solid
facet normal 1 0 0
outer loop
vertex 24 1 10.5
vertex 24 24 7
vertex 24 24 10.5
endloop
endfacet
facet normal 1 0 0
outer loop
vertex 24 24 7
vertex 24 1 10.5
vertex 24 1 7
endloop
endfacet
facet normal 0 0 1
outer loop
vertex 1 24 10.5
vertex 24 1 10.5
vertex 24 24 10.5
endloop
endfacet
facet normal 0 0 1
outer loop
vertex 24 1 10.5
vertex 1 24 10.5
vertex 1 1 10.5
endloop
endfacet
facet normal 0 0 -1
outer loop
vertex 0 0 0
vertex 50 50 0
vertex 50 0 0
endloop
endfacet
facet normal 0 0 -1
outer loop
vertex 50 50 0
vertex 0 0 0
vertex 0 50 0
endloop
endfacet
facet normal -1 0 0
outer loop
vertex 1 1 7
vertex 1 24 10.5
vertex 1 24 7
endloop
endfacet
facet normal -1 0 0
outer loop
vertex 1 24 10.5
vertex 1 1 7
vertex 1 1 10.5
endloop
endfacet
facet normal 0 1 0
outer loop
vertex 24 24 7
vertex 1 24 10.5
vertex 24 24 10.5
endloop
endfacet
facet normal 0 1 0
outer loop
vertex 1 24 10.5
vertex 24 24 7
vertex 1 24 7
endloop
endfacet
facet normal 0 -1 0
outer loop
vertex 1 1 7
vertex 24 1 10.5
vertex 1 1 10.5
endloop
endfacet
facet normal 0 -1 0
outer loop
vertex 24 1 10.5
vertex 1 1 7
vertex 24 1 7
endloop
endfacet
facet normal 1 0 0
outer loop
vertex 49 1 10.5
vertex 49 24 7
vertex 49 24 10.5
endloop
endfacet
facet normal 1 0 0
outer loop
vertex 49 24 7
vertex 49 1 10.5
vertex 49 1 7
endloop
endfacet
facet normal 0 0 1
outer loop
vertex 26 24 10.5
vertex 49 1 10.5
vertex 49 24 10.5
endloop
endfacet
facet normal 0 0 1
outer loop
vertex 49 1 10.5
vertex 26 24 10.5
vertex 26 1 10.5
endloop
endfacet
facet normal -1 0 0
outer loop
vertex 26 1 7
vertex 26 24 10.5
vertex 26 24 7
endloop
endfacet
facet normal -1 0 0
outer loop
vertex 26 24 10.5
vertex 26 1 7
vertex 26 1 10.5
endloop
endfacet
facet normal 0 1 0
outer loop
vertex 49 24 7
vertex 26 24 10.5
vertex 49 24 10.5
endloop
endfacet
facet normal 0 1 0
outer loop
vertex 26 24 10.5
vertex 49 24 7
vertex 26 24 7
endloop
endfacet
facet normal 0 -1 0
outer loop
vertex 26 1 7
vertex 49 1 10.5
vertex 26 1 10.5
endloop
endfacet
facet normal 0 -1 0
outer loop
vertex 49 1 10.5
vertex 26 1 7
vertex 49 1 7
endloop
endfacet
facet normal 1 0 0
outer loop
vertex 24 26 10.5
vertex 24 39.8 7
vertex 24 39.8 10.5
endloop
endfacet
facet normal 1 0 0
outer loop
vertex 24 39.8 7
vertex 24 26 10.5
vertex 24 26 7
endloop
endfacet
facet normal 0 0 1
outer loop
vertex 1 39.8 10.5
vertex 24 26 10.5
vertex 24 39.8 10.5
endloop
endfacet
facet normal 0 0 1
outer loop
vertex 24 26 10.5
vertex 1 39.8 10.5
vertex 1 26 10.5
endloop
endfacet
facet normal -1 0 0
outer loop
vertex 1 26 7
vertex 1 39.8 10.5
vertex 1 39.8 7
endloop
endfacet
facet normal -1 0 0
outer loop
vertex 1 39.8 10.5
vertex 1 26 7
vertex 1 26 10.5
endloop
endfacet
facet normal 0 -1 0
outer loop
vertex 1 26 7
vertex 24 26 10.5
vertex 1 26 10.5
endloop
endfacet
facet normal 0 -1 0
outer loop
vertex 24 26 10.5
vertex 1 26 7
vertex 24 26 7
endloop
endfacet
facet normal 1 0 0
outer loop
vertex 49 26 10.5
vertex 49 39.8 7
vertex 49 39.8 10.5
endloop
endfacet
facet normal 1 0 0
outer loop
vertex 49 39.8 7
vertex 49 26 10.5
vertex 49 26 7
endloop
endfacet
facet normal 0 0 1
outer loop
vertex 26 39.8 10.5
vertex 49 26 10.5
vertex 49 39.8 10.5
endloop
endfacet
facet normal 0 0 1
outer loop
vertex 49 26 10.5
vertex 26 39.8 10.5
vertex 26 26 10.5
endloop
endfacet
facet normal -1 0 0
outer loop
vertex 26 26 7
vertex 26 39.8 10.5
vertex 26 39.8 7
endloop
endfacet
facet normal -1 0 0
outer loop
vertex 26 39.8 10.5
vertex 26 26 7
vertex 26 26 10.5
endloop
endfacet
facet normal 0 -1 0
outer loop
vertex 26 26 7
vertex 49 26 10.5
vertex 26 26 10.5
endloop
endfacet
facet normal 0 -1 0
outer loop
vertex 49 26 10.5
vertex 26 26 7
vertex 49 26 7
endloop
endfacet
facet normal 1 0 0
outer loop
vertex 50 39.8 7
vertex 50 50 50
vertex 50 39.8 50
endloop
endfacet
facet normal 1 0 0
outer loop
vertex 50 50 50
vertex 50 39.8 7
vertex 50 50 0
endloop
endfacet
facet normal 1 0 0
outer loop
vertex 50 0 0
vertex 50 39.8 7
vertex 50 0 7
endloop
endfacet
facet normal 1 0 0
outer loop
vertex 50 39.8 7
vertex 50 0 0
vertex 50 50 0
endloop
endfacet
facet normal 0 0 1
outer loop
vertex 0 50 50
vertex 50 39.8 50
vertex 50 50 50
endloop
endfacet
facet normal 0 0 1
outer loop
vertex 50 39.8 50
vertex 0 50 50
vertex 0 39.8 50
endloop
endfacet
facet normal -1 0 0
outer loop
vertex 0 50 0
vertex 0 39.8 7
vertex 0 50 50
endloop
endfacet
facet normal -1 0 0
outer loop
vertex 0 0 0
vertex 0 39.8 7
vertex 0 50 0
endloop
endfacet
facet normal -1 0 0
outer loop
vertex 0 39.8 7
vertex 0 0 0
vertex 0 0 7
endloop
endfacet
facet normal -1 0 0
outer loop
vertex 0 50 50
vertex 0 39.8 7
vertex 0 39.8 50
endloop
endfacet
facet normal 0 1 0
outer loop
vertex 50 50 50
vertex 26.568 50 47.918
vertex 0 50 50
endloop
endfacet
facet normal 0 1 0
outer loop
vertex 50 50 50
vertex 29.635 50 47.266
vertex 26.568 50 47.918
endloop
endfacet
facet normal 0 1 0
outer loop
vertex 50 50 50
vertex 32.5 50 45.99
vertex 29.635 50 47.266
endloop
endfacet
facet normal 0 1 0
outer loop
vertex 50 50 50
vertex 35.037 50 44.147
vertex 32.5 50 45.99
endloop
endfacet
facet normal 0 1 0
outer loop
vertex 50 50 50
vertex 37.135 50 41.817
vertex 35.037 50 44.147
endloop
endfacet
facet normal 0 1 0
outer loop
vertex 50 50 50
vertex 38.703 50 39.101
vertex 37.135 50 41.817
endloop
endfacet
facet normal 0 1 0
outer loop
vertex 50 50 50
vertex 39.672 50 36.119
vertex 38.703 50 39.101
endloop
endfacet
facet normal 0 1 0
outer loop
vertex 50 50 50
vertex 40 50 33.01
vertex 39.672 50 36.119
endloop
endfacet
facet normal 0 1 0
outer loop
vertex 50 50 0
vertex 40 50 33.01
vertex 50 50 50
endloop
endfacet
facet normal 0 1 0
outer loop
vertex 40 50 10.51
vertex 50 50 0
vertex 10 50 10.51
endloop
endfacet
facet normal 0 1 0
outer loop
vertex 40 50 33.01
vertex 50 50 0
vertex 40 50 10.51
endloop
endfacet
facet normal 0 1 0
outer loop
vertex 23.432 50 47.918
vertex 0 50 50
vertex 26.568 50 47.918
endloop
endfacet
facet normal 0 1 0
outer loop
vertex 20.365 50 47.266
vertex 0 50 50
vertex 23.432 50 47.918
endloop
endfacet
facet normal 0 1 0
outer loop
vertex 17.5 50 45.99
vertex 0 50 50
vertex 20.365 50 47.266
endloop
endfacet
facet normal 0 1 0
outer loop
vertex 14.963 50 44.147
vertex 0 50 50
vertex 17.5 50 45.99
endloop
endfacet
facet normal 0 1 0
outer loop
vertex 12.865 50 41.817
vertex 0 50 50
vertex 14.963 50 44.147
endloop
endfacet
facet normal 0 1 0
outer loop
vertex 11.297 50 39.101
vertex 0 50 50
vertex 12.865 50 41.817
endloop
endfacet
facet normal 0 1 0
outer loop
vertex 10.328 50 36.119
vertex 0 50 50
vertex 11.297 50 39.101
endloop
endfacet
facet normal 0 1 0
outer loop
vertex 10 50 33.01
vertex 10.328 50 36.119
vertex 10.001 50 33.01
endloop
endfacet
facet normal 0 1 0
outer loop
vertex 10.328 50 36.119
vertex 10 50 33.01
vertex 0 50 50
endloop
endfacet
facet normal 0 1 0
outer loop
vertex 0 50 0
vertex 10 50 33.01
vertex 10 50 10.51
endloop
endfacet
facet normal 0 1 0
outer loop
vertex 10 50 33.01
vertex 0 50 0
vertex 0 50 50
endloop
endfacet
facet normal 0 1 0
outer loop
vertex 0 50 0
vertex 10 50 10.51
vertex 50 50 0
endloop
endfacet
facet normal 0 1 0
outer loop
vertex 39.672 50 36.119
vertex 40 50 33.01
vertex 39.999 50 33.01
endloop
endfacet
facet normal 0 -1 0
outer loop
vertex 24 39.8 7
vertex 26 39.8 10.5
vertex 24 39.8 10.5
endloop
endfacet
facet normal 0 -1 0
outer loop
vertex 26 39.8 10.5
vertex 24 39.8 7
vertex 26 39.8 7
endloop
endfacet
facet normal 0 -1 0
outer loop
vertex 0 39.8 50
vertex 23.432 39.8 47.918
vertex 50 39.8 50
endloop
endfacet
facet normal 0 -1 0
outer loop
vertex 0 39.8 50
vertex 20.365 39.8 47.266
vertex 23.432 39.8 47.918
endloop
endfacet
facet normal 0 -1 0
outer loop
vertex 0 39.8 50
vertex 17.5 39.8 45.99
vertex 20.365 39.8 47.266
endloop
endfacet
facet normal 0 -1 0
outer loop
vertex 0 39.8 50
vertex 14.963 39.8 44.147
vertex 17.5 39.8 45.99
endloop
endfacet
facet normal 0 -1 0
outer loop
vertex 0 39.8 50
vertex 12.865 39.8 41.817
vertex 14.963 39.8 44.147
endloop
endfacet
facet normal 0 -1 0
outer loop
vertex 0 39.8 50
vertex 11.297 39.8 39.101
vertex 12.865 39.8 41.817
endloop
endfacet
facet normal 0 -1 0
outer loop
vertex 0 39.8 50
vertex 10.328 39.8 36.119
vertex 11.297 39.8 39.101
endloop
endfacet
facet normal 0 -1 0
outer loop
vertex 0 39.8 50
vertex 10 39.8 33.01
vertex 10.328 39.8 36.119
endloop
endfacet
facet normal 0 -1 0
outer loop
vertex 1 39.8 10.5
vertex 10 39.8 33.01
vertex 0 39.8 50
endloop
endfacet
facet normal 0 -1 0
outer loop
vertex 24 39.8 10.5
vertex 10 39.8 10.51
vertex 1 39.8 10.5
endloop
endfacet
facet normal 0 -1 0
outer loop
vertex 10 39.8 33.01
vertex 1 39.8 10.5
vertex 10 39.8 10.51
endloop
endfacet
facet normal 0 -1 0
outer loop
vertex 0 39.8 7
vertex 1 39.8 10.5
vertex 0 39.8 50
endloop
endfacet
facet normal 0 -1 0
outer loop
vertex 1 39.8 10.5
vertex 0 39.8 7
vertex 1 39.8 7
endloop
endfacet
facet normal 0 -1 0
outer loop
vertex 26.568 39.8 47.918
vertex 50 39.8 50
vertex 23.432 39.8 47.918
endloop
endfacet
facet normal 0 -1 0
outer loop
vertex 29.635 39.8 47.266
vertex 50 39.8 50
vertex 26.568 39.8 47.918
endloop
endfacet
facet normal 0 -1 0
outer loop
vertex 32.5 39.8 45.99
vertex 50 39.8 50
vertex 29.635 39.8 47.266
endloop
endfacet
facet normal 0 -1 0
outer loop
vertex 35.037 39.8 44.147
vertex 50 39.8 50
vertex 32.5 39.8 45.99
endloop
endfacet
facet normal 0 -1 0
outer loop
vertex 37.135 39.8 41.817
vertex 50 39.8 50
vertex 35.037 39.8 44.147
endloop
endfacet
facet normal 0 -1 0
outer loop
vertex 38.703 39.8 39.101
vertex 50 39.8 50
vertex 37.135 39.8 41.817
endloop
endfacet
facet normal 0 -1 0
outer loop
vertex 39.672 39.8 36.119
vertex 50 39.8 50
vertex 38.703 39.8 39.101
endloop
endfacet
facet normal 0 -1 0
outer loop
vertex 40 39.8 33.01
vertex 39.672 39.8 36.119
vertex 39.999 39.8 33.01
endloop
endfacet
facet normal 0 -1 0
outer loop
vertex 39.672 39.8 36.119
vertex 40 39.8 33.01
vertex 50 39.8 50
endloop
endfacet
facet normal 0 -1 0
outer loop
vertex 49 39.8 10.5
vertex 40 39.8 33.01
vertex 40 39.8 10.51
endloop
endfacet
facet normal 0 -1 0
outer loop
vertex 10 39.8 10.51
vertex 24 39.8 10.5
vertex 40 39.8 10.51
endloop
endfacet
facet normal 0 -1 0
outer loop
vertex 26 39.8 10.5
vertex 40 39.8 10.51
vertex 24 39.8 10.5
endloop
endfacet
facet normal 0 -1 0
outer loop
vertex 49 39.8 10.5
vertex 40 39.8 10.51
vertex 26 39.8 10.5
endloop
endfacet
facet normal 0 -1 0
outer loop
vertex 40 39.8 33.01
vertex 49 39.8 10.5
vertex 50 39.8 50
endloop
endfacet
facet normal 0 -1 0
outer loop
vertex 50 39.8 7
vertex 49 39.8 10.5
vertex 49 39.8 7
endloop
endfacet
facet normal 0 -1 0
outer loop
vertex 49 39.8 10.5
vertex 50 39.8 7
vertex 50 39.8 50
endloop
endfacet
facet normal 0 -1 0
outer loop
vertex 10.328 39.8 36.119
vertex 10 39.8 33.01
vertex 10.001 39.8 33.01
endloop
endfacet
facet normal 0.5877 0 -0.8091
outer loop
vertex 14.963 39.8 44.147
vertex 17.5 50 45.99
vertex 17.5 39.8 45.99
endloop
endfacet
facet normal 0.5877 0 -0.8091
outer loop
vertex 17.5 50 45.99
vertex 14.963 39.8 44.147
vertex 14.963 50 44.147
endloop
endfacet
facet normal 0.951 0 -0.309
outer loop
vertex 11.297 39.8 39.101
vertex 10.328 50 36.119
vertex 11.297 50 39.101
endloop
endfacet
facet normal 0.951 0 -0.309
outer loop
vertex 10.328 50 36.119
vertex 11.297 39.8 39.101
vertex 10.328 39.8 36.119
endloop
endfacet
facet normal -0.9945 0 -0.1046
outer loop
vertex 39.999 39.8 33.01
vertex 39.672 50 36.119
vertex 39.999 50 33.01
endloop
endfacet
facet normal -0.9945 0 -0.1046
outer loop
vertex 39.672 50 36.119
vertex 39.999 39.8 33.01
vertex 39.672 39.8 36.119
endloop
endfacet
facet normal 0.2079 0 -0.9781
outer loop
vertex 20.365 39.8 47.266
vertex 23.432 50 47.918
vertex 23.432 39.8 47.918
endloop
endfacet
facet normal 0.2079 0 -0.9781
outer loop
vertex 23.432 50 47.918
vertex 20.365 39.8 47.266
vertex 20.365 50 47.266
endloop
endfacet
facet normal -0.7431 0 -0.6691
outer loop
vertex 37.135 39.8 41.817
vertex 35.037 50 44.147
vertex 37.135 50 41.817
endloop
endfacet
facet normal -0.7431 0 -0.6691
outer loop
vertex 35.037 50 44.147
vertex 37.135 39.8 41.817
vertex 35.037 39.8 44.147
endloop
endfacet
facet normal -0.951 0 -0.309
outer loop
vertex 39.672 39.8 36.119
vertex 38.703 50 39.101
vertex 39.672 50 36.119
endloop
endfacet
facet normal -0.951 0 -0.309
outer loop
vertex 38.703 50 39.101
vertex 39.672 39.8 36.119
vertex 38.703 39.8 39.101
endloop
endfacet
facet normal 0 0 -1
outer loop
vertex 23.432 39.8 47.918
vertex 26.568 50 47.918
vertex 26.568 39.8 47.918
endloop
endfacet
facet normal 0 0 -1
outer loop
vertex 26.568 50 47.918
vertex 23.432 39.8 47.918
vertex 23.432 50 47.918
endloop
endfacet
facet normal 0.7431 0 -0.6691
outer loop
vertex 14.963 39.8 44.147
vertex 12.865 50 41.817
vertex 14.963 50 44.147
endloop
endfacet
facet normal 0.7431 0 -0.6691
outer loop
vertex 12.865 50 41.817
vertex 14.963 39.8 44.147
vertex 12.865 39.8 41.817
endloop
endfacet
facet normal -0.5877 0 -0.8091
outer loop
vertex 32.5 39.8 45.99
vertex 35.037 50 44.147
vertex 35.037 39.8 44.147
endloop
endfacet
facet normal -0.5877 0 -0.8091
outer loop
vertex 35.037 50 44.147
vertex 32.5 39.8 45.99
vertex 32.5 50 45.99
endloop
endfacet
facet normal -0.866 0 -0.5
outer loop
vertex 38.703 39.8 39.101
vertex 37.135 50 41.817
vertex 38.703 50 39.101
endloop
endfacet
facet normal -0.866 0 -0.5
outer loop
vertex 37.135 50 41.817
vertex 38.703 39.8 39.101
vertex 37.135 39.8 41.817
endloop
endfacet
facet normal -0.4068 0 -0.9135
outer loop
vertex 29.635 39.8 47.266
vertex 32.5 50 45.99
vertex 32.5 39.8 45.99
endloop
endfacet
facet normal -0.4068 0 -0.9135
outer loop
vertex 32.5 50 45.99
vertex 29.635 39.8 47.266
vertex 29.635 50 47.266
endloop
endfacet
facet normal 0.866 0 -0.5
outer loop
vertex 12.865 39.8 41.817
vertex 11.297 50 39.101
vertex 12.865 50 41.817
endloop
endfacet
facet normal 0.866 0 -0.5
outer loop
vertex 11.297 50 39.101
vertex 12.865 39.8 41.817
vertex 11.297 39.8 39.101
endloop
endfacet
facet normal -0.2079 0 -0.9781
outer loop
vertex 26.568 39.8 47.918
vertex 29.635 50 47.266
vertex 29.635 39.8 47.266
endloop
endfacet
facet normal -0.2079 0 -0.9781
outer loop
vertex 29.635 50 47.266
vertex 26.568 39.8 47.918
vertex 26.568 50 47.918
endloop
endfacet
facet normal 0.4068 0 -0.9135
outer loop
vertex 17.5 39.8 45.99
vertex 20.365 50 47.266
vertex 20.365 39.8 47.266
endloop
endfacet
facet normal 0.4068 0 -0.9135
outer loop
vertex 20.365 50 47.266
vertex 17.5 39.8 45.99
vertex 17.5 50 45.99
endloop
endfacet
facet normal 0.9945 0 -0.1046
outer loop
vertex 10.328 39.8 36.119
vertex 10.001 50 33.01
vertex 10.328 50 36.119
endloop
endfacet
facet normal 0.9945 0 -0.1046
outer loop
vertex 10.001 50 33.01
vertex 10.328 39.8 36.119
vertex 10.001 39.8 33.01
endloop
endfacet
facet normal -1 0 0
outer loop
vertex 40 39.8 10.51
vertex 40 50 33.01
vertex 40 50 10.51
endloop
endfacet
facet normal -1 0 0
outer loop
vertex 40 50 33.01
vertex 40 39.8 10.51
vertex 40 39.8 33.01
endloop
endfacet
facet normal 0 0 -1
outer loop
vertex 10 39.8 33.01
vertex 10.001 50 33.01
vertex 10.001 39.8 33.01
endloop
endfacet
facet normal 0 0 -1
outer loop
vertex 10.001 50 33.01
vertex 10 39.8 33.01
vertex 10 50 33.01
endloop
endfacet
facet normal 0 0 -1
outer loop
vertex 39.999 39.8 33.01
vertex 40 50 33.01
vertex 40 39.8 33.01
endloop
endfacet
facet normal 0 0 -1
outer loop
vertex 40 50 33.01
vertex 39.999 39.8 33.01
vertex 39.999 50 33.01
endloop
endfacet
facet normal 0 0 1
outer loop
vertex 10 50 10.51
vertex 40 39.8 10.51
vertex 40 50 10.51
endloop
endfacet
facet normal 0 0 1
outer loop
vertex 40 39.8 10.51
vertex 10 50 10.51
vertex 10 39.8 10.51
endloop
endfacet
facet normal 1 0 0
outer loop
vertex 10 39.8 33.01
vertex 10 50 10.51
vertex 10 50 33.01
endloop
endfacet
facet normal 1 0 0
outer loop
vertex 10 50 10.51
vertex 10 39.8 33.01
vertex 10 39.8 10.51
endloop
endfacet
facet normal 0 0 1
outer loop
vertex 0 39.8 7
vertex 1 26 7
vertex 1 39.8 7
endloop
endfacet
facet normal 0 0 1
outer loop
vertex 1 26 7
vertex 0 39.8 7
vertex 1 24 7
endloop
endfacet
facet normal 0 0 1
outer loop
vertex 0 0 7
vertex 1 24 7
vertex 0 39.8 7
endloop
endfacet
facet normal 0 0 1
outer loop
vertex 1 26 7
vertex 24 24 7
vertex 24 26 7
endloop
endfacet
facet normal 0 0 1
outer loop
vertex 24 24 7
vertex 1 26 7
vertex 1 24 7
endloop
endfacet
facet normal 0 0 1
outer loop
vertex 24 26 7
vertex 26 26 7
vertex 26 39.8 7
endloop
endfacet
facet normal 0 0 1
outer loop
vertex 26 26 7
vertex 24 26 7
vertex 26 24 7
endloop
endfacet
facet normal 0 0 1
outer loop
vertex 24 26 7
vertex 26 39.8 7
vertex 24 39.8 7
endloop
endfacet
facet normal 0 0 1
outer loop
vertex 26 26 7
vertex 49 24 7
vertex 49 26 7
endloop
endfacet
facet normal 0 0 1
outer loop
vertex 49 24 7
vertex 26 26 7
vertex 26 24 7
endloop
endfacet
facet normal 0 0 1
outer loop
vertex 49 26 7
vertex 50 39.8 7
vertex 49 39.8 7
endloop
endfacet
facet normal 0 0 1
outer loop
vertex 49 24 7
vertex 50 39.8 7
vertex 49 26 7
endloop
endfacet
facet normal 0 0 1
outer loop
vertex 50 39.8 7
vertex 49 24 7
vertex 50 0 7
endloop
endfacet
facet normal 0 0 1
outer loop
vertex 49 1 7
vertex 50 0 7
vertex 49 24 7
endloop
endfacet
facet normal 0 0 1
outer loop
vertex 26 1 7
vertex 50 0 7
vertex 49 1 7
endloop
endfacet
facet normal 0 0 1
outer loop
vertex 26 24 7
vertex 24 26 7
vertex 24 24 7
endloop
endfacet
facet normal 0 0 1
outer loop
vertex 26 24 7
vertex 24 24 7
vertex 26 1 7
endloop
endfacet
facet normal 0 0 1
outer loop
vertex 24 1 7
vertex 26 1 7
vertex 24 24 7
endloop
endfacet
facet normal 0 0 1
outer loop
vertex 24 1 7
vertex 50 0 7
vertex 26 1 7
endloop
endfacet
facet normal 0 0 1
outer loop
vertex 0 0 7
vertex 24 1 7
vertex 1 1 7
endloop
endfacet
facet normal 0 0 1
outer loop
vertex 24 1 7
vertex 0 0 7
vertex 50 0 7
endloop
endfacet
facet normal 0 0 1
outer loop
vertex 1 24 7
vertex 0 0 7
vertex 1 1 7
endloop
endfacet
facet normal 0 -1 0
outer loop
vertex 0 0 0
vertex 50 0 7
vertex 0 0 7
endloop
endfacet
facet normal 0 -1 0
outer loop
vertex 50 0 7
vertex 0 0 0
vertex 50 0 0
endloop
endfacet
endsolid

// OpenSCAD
color("LightGray") {
    translate([1,1,0]) cube([23,23,6+4.5]);
    translate([25+1,1,0]) cube([23,23,6+4.5]);
    translate([1,25+1,0]) cube([23,23,6+4.5]);
    translate([25+1,25+1,0]) cube([23,23,6+4.5]);
}
color("Grey") {
    cube([50,50,7]);
    difference() {
        translate([0,50-10.2,0]) cube([50,10.2,50]);
        translate([25,25,6+27]) rotate([-90,0,0]) cylinder(50,15,15);
        translate([10,25,6+4.51]) cube([30,50,27-4.5]);
    }
}
